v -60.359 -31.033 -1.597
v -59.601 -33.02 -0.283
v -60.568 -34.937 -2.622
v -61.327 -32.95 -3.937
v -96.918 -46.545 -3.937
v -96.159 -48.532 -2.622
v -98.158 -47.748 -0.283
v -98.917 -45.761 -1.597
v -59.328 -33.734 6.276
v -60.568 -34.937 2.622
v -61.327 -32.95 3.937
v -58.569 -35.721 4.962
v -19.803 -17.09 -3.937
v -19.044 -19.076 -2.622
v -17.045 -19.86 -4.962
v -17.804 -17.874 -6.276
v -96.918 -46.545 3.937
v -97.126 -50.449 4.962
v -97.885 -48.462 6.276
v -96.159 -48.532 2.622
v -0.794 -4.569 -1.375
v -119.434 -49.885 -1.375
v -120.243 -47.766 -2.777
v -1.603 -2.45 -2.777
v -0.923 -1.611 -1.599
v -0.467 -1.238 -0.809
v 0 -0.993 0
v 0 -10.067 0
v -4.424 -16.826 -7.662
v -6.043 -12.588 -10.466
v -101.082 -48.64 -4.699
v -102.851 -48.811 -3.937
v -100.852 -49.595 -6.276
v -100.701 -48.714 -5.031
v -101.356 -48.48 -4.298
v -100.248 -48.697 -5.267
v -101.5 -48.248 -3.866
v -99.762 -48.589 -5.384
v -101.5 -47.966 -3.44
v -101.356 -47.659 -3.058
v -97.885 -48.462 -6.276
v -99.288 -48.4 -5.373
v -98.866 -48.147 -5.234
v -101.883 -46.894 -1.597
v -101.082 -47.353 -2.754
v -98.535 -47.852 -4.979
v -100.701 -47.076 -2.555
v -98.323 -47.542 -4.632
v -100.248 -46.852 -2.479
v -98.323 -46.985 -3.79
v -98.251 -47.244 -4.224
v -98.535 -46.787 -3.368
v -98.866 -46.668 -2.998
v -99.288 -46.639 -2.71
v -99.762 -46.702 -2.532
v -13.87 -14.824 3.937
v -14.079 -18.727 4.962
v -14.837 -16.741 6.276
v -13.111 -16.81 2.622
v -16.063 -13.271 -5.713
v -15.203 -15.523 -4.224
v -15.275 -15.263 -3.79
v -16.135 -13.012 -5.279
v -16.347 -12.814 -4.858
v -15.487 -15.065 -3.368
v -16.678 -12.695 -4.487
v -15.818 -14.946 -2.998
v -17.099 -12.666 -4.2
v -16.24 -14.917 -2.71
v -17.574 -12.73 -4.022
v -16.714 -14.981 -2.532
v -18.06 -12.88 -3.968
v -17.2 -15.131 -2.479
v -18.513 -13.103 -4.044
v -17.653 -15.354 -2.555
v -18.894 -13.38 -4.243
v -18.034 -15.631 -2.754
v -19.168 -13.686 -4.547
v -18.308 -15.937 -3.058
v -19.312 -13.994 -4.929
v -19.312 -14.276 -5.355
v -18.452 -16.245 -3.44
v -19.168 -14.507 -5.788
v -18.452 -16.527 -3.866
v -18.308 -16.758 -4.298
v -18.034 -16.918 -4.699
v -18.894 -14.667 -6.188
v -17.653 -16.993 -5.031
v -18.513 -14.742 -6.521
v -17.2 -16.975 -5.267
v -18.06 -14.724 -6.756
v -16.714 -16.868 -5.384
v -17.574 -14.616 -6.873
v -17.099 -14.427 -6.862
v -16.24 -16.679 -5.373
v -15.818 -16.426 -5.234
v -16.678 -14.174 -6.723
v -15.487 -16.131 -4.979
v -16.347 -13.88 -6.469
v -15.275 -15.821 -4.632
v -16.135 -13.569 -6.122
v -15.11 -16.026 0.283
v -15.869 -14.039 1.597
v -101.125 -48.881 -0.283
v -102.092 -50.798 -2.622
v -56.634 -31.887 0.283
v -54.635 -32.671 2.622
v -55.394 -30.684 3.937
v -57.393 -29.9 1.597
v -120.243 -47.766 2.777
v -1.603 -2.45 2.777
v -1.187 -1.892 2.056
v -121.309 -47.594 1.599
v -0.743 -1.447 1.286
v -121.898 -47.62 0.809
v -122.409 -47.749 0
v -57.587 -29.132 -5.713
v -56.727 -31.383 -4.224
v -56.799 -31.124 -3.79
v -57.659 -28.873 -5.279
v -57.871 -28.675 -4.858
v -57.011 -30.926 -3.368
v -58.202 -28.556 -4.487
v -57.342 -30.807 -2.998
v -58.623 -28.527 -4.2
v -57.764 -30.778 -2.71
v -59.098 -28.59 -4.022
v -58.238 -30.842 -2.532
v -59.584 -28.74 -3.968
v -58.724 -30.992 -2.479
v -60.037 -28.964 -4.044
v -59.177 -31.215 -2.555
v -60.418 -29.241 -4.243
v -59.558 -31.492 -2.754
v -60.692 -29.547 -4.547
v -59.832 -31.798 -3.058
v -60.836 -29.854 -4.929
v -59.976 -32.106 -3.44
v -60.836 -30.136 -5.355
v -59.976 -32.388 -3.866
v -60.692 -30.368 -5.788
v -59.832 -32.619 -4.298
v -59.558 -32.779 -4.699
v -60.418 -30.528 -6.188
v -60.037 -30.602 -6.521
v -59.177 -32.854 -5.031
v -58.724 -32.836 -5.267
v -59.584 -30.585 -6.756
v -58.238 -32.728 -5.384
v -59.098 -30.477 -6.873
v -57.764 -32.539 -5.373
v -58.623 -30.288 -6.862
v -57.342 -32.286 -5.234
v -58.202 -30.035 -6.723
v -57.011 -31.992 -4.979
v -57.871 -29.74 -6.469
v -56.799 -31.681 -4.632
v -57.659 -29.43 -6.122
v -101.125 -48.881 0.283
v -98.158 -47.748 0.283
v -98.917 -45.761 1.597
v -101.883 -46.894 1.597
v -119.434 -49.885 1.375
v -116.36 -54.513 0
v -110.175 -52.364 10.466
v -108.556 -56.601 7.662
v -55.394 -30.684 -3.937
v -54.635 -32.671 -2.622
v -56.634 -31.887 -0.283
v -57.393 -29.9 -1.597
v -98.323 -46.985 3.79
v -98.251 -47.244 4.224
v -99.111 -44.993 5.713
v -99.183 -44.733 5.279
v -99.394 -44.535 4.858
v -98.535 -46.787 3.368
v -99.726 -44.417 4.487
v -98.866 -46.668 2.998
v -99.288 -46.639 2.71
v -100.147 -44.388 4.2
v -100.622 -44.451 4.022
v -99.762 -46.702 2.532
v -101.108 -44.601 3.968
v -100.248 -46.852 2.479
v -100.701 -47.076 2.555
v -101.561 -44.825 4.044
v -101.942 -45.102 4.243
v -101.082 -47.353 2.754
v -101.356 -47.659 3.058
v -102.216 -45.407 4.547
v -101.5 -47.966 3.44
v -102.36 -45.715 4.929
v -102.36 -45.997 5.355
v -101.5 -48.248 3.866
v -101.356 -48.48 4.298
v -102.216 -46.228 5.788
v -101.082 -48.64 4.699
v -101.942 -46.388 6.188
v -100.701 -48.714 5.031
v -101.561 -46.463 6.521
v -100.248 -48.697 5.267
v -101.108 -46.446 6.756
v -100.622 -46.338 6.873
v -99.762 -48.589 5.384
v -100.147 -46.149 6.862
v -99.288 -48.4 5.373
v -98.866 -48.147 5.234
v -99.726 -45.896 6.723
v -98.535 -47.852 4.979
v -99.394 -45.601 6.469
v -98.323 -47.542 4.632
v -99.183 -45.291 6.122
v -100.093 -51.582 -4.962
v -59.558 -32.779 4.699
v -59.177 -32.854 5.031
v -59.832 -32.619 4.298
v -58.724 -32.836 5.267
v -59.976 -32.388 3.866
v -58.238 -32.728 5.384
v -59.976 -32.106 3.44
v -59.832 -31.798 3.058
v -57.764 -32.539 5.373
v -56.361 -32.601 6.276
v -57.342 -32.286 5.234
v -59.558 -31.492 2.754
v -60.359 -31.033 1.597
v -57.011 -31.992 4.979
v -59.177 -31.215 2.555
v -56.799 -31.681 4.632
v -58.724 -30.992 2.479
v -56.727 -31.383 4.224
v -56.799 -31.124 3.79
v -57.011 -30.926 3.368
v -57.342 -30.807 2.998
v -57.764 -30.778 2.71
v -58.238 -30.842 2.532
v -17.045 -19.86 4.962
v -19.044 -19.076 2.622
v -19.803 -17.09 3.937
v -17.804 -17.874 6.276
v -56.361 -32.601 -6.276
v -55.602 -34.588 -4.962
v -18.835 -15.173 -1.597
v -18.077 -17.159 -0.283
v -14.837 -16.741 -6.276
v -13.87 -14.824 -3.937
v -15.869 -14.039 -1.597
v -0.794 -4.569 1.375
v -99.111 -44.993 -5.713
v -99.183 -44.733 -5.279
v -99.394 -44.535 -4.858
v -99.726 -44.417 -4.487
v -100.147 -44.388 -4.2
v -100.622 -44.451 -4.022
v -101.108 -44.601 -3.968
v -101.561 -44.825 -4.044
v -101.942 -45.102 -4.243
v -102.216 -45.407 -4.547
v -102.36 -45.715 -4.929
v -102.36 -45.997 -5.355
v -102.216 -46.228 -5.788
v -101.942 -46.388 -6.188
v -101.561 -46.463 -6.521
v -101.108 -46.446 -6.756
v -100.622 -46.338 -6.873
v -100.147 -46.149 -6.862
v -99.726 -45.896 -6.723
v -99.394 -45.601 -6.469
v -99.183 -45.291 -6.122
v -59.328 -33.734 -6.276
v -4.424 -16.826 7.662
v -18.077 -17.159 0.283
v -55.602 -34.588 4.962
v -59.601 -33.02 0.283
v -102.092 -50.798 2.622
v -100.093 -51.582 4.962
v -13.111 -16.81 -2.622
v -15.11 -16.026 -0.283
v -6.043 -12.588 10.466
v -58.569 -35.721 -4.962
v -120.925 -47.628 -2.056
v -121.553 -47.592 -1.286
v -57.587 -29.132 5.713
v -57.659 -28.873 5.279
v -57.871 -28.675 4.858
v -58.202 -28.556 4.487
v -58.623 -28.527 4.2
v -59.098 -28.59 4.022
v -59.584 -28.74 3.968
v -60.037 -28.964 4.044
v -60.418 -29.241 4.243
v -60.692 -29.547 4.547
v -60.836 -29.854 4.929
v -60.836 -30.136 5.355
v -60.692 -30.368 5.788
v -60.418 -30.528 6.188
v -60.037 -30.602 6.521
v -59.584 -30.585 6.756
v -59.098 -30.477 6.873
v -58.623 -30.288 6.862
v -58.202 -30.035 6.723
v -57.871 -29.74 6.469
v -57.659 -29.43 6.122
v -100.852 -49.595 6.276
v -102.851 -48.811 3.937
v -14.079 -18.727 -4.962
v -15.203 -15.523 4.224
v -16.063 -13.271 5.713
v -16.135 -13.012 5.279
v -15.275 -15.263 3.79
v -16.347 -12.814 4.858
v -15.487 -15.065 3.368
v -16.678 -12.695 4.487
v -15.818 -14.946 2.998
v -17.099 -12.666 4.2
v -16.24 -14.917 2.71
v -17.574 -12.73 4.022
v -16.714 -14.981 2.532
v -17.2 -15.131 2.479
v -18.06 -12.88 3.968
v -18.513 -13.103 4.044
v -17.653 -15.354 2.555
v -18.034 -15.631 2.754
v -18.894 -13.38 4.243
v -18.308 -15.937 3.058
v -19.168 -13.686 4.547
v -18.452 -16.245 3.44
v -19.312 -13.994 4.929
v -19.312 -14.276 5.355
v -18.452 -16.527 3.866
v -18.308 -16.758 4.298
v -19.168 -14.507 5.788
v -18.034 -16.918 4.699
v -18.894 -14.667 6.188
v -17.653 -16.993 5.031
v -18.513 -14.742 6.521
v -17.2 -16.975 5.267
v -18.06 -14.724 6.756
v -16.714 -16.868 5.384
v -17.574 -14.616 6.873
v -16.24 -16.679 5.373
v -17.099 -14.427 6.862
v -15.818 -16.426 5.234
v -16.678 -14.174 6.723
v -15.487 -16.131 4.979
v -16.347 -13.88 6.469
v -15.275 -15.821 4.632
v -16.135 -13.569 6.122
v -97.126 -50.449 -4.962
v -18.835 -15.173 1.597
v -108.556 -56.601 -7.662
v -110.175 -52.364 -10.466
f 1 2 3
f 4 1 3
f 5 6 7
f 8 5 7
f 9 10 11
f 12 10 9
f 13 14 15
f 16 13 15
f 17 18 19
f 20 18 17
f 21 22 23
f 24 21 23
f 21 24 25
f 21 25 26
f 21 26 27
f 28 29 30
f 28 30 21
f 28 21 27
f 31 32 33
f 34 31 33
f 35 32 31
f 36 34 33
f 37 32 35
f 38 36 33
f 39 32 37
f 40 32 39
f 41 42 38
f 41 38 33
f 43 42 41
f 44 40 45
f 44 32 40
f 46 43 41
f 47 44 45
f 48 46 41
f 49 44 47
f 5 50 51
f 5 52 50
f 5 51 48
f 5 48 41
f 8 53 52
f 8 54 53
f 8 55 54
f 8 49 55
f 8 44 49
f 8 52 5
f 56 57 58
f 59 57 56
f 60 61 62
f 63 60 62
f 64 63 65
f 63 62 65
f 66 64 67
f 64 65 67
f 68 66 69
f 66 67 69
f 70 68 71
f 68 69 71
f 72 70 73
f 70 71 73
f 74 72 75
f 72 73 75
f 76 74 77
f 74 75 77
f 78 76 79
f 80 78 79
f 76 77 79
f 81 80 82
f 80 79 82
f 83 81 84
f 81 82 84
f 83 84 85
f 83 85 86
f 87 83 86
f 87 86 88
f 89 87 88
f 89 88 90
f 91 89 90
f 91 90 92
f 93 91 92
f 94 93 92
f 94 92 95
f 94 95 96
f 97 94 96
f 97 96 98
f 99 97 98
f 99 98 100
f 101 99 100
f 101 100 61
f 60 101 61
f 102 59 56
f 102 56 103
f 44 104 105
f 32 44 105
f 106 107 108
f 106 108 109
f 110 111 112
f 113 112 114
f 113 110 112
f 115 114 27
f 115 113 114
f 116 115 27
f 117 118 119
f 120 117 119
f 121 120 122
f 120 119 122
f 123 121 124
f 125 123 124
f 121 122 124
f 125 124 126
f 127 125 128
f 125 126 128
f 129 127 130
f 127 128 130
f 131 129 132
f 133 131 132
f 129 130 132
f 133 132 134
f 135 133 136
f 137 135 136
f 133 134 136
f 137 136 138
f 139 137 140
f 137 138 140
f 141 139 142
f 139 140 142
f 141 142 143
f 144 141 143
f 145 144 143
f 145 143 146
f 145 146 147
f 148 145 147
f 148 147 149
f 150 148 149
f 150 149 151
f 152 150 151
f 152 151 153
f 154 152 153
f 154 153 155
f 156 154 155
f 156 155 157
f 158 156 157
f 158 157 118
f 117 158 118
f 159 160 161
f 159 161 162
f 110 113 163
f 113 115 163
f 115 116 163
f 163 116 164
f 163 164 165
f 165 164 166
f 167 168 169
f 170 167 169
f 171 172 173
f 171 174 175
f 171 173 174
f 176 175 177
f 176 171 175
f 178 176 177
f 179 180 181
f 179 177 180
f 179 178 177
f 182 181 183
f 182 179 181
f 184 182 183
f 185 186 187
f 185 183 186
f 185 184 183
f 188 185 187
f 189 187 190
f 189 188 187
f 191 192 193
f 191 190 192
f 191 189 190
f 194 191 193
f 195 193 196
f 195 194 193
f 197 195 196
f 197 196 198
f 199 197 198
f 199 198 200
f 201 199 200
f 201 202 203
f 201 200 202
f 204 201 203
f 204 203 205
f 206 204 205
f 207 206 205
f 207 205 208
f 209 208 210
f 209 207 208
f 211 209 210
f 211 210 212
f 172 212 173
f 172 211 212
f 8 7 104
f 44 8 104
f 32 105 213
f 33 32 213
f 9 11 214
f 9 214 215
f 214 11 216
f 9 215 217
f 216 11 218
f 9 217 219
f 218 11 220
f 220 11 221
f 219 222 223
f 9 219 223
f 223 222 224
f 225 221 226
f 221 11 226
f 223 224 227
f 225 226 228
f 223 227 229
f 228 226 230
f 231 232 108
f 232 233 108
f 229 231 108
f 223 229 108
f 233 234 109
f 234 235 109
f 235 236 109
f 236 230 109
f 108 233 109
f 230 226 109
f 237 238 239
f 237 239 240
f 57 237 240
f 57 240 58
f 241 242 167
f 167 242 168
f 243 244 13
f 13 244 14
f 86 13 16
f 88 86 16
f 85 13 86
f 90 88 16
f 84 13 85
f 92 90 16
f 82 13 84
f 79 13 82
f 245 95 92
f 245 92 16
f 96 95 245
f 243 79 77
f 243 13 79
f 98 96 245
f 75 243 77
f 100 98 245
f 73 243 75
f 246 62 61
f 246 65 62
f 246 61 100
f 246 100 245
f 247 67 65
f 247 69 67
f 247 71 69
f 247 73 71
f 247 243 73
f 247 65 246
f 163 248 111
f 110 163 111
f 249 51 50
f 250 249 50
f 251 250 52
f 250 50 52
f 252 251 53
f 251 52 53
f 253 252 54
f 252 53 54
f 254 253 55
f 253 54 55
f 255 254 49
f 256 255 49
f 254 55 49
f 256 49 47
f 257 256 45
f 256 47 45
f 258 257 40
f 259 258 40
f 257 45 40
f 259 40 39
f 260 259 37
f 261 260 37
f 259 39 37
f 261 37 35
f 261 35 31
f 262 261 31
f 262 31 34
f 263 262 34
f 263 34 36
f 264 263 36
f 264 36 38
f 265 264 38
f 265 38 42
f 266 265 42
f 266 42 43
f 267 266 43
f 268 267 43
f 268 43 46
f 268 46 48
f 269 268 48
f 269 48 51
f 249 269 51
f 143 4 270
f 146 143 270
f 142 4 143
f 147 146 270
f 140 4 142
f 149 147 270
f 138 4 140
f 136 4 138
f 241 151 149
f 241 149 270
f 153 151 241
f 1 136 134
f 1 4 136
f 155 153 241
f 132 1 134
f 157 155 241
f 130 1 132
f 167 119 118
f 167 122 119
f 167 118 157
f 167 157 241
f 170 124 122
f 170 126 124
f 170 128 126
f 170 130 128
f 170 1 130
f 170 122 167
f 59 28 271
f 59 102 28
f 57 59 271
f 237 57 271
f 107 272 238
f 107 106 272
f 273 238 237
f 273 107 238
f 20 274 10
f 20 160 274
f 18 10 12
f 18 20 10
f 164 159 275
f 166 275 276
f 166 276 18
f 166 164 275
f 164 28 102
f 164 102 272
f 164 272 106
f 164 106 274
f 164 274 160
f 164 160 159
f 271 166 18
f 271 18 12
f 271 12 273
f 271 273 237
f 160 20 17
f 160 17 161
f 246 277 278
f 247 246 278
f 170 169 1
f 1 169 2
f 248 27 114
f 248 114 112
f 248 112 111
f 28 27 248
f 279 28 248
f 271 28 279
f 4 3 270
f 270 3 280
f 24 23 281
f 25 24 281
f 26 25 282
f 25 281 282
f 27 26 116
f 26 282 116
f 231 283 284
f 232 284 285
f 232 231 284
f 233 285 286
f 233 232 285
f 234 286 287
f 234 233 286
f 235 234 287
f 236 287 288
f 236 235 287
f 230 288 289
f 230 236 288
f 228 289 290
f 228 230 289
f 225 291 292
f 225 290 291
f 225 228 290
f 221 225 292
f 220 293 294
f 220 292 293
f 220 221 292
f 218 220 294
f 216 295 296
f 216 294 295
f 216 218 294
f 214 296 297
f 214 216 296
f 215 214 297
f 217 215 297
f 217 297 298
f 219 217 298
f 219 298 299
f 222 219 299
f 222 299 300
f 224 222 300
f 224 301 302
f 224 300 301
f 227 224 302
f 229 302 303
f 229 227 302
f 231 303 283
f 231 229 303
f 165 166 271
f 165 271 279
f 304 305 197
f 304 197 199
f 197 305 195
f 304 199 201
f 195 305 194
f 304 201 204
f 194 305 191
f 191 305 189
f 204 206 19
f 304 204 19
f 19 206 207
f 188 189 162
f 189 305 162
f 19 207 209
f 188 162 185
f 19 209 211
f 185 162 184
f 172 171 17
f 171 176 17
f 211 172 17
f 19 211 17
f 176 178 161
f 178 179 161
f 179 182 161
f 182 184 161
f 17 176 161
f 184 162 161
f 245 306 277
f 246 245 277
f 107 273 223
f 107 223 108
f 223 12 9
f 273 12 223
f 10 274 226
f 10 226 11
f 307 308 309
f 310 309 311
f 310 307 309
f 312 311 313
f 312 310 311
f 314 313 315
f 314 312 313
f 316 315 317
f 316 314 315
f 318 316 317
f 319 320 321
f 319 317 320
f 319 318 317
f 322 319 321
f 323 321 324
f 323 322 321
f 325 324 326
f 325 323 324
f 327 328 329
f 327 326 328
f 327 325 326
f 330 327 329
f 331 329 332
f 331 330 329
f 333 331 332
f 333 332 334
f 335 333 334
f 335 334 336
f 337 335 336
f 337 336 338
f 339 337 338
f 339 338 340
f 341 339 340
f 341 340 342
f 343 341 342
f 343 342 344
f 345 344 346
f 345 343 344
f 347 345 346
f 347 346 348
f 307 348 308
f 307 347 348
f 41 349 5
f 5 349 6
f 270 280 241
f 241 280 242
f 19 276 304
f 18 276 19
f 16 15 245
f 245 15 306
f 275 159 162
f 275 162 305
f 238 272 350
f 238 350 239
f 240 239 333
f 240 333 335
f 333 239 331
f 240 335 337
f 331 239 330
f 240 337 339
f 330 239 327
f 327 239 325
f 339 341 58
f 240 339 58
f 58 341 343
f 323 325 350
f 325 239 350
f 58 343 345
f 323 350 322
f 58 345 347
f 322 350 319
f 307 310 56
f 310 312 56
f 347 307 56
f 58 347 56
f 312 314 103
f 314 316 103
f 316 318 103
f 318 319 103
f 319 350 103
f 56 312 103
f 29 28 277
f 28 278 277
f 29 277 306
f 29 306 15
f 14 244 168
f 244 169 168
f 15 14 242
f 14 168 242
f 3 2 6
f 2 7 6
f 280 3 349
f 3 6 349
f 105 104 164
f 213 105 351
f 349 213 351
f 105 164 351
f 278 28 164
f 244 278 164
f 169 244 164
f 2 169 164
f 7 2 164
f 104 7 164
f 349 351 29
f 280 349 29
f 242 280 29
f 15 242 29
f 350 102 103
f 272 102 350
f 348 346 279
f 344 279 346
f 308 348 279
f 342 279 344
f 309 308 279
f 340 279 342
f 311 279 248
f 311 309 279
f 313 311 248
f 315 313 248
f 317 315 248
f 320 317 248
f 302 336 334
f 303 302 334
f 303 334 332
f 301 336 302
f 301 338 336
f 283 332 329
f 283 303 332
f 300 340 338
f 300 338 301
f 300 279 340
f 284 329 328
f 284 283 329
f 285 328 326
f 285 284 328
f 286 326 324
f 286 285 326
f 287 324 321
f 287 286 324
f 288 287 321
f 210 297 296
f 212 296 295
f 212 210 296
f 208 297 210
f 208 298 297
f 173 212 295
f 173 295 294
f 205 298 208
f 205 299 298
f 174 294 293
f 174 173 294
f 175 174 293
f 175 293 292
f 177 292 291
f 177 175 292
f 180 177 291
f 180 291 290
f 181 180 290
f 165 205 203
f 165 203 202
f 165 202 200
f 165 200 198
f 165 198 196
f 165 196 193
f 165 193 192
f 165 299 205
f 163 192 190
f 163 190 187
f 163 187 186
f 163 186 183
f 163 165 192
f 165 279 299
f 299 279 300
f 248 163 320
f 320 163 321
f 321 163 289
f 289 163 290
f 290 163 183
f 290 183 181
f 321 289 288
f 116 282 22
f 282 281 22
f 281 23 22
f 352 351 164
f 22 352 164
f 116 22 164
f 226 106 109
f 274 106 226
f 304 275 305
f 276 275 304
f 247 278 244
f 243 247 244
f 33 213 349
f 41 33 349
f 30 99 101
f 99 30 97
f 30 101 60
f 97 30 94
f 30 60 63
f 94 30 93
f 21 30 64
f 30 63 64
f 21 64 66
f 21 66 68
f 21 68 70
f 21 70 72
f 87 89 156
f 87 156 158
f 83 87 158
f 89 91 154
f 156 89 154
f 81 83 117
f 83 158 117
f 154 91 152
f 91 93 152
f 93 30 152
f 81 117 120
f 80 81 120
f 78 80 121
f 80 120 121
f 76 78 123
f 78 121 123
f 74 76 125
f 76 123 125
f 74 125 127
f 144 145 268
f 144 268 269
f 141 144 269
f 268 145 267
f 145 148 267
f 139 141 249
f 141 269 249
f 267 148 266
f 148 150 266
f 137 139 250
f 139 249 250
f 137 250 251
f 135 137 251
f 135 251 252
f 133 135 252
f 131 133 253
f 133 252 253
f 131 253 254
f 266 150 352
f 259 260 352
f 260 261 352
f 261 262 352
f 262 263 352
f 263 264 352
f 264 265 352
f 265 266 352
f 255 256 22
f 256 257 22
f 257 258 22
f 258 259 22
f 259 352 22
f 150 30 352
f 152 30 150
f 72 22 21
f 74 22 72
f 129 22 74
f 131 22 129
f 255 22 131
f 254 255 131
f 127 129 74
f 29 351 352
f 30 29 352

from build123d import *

# Parameters (mm, degrees)
BOSS_EXTRUDE1_DEPTH = 76.2
CUT_EXTRUDE2_START  = -64.90373811
CUT_EXTRUDE2_DEPTH  = 68.722745412
SKETCH4_R           = 1.7145
CUT_EXTRUDE3_DEPTH  = 2.5
SKETCH6_R           = 1.7145
CUT_EXTRUDE4_DEPTH  = 50.868554483


with BuildPart() as part:
    # Sketch2 → Boss-Extrude1 (new body, symmetric)
    with BuildSketch(Plane(origin=(-61.535605536, -23.504509797, 0), x_dir=(0, 0, 1), z_dir=(-0.934172359, -0.35682209, 0))):
        with BuildLine():
            Line((-1.374815328, -3.984929137), (-2.776940204, -1.716243431))
            ThreePointArc((-2.776940204, -1.716243431), (-1.443408604, -1.128416568), (0, -0.927372913))
            Line((0, -0.927372913), (0, -9.404564037))
            Line((0, -9.404564037), (-7.662421822, -14.140201159))
            Line((-7.662421822, -14.140201159), (-10.466145843, -9.603680398))
            Line((-10.466145843, -9.603680398), (-1.374815328, -3.984929137))
        make_face()
    boss_extrude1 = extrude(amount=BOSS_EXTRUDE1_DEPTH, both=True)

    # Mirror4: Boss-Extrude1 across plane
    add(boss_extrude1.mirror(Plane(origin=(13.00408441, -5.100150327, 0), x_dir=(1, 0, 0), z_dir=(0, 0, 1))))

    # Sketch3 → Cut-Extrude2 (cut)
    with BuildSketch(Plane(origin=(0, 0, 0), x_dir=(1, 0, 0), z_dir=(0, 1, 0)).offset(CUT_EXTRUDE2_START)):
        Polygon((-6.04263212, 10.466145843), (0, 0), (-6.04263212, -10.466145843), (57.45736788, -10.466145843), (57.45736788, 10.466145843), align=None)
    cut_extrude2 = extrude(amount=CUT_EXTRUDE2_DEPTH, mode=Mode.SUBTRACT)

    # Mirror5: Cut-Extrude2 across plane
    add(cut_extrude2.mirror(Plane(origin=(-61.535605536, -23.504509797, 0), x_dir=(0, 0, 1), z_dir=(0.934172359, 0.35682209, 0))), mode=Mode.SUBTRACT)

    # Sketch4 → Cut-Extrude3 (cut)
    with BuildSketch(Plane(origin=(2.428247993, -6.357235778, 4.205848897), x_dir=(0.952821564, 0.253145264, -0.167476992), z_dir=(0.303530999, -0.794654472, 0.525731112))):
        Polygon((-109.695418088, -30.215326769), (-107.597357756, -32.598911501), (-104.48408266, -31.973730321), (-103.468867896, -28.964964409), (-105.566928228, -26.581379677), (-108.680203324, -27.206560857), align=None)
        with Locations((-106.582142992, -29.590145589)):
            Circle(SKETCH4_R, mode=Mode.SUBTRACT)
        Polygon((-66.115420605, -21.46396577), (-64.017360273, -23.847550502), (-60.904085176, -23.222369322), (-59.888870412, -20.21360341), (-61.986930744, -17.830018678), (-65.100205841, -18.455199858), align=None)
        with Locations((-63.002145509, -20.83878459)):
            Circle(SKETCH4_R, mode=Mode.SUBTRACT)
        Polygon((-22.535423121, -12.712604771), (-20.437362789, -15.096189503), (-17.324087693, -14.471008323), (-16.308872929, -11.462242411), (-18.406933261, -9.078657679), (-21.520208357, -9.703838859), align=None)
        with Locations((-19.422148025, -12.087423591)):
            Circle(SKETCH4_R, mode=Mode.SUBTRACT)
    cut_extrude3 = extrude(amount=-CUT_EXTRUDE3_DEPTH, mode=Mode.SUBTRACT)

    # Sketch6 → Cut-Extrude4 (cut, through all)
    with BuildSketch(Plane(origin=(2.428247993, -6.357235778, 4.205848897), x_dir=(0.952821564, 0.253145264, -0.167476992), z_dir=(0.303530999, -0.794654472, 0.525731112))):
        with Locations((-106.582142992, -29.590145589)):
            Circle(SKETCH6_R)
        with Locations((-63.002145509, -20.83878459)):
            Circle(SKETCH6_R)
        with Locations((-19.422148025, -12.087423591)):
            Circle(SKETCH6_R)
    cut_extrude4 = extrude(amount=-CUT_EXTRUDE4_DEPTH, mode=Mode.SUBTRACT)

    # Mirror6: Cut-Extrude3, Cut-Extrude4 across plane
    add(cut_extrude3.mirror(Plane.XY), mode=Mode.SUBTRACT)
    add(cut_extrude4.mirror(Plane.XY), mode=Mode.SUBTRACT)


solid = part.part
